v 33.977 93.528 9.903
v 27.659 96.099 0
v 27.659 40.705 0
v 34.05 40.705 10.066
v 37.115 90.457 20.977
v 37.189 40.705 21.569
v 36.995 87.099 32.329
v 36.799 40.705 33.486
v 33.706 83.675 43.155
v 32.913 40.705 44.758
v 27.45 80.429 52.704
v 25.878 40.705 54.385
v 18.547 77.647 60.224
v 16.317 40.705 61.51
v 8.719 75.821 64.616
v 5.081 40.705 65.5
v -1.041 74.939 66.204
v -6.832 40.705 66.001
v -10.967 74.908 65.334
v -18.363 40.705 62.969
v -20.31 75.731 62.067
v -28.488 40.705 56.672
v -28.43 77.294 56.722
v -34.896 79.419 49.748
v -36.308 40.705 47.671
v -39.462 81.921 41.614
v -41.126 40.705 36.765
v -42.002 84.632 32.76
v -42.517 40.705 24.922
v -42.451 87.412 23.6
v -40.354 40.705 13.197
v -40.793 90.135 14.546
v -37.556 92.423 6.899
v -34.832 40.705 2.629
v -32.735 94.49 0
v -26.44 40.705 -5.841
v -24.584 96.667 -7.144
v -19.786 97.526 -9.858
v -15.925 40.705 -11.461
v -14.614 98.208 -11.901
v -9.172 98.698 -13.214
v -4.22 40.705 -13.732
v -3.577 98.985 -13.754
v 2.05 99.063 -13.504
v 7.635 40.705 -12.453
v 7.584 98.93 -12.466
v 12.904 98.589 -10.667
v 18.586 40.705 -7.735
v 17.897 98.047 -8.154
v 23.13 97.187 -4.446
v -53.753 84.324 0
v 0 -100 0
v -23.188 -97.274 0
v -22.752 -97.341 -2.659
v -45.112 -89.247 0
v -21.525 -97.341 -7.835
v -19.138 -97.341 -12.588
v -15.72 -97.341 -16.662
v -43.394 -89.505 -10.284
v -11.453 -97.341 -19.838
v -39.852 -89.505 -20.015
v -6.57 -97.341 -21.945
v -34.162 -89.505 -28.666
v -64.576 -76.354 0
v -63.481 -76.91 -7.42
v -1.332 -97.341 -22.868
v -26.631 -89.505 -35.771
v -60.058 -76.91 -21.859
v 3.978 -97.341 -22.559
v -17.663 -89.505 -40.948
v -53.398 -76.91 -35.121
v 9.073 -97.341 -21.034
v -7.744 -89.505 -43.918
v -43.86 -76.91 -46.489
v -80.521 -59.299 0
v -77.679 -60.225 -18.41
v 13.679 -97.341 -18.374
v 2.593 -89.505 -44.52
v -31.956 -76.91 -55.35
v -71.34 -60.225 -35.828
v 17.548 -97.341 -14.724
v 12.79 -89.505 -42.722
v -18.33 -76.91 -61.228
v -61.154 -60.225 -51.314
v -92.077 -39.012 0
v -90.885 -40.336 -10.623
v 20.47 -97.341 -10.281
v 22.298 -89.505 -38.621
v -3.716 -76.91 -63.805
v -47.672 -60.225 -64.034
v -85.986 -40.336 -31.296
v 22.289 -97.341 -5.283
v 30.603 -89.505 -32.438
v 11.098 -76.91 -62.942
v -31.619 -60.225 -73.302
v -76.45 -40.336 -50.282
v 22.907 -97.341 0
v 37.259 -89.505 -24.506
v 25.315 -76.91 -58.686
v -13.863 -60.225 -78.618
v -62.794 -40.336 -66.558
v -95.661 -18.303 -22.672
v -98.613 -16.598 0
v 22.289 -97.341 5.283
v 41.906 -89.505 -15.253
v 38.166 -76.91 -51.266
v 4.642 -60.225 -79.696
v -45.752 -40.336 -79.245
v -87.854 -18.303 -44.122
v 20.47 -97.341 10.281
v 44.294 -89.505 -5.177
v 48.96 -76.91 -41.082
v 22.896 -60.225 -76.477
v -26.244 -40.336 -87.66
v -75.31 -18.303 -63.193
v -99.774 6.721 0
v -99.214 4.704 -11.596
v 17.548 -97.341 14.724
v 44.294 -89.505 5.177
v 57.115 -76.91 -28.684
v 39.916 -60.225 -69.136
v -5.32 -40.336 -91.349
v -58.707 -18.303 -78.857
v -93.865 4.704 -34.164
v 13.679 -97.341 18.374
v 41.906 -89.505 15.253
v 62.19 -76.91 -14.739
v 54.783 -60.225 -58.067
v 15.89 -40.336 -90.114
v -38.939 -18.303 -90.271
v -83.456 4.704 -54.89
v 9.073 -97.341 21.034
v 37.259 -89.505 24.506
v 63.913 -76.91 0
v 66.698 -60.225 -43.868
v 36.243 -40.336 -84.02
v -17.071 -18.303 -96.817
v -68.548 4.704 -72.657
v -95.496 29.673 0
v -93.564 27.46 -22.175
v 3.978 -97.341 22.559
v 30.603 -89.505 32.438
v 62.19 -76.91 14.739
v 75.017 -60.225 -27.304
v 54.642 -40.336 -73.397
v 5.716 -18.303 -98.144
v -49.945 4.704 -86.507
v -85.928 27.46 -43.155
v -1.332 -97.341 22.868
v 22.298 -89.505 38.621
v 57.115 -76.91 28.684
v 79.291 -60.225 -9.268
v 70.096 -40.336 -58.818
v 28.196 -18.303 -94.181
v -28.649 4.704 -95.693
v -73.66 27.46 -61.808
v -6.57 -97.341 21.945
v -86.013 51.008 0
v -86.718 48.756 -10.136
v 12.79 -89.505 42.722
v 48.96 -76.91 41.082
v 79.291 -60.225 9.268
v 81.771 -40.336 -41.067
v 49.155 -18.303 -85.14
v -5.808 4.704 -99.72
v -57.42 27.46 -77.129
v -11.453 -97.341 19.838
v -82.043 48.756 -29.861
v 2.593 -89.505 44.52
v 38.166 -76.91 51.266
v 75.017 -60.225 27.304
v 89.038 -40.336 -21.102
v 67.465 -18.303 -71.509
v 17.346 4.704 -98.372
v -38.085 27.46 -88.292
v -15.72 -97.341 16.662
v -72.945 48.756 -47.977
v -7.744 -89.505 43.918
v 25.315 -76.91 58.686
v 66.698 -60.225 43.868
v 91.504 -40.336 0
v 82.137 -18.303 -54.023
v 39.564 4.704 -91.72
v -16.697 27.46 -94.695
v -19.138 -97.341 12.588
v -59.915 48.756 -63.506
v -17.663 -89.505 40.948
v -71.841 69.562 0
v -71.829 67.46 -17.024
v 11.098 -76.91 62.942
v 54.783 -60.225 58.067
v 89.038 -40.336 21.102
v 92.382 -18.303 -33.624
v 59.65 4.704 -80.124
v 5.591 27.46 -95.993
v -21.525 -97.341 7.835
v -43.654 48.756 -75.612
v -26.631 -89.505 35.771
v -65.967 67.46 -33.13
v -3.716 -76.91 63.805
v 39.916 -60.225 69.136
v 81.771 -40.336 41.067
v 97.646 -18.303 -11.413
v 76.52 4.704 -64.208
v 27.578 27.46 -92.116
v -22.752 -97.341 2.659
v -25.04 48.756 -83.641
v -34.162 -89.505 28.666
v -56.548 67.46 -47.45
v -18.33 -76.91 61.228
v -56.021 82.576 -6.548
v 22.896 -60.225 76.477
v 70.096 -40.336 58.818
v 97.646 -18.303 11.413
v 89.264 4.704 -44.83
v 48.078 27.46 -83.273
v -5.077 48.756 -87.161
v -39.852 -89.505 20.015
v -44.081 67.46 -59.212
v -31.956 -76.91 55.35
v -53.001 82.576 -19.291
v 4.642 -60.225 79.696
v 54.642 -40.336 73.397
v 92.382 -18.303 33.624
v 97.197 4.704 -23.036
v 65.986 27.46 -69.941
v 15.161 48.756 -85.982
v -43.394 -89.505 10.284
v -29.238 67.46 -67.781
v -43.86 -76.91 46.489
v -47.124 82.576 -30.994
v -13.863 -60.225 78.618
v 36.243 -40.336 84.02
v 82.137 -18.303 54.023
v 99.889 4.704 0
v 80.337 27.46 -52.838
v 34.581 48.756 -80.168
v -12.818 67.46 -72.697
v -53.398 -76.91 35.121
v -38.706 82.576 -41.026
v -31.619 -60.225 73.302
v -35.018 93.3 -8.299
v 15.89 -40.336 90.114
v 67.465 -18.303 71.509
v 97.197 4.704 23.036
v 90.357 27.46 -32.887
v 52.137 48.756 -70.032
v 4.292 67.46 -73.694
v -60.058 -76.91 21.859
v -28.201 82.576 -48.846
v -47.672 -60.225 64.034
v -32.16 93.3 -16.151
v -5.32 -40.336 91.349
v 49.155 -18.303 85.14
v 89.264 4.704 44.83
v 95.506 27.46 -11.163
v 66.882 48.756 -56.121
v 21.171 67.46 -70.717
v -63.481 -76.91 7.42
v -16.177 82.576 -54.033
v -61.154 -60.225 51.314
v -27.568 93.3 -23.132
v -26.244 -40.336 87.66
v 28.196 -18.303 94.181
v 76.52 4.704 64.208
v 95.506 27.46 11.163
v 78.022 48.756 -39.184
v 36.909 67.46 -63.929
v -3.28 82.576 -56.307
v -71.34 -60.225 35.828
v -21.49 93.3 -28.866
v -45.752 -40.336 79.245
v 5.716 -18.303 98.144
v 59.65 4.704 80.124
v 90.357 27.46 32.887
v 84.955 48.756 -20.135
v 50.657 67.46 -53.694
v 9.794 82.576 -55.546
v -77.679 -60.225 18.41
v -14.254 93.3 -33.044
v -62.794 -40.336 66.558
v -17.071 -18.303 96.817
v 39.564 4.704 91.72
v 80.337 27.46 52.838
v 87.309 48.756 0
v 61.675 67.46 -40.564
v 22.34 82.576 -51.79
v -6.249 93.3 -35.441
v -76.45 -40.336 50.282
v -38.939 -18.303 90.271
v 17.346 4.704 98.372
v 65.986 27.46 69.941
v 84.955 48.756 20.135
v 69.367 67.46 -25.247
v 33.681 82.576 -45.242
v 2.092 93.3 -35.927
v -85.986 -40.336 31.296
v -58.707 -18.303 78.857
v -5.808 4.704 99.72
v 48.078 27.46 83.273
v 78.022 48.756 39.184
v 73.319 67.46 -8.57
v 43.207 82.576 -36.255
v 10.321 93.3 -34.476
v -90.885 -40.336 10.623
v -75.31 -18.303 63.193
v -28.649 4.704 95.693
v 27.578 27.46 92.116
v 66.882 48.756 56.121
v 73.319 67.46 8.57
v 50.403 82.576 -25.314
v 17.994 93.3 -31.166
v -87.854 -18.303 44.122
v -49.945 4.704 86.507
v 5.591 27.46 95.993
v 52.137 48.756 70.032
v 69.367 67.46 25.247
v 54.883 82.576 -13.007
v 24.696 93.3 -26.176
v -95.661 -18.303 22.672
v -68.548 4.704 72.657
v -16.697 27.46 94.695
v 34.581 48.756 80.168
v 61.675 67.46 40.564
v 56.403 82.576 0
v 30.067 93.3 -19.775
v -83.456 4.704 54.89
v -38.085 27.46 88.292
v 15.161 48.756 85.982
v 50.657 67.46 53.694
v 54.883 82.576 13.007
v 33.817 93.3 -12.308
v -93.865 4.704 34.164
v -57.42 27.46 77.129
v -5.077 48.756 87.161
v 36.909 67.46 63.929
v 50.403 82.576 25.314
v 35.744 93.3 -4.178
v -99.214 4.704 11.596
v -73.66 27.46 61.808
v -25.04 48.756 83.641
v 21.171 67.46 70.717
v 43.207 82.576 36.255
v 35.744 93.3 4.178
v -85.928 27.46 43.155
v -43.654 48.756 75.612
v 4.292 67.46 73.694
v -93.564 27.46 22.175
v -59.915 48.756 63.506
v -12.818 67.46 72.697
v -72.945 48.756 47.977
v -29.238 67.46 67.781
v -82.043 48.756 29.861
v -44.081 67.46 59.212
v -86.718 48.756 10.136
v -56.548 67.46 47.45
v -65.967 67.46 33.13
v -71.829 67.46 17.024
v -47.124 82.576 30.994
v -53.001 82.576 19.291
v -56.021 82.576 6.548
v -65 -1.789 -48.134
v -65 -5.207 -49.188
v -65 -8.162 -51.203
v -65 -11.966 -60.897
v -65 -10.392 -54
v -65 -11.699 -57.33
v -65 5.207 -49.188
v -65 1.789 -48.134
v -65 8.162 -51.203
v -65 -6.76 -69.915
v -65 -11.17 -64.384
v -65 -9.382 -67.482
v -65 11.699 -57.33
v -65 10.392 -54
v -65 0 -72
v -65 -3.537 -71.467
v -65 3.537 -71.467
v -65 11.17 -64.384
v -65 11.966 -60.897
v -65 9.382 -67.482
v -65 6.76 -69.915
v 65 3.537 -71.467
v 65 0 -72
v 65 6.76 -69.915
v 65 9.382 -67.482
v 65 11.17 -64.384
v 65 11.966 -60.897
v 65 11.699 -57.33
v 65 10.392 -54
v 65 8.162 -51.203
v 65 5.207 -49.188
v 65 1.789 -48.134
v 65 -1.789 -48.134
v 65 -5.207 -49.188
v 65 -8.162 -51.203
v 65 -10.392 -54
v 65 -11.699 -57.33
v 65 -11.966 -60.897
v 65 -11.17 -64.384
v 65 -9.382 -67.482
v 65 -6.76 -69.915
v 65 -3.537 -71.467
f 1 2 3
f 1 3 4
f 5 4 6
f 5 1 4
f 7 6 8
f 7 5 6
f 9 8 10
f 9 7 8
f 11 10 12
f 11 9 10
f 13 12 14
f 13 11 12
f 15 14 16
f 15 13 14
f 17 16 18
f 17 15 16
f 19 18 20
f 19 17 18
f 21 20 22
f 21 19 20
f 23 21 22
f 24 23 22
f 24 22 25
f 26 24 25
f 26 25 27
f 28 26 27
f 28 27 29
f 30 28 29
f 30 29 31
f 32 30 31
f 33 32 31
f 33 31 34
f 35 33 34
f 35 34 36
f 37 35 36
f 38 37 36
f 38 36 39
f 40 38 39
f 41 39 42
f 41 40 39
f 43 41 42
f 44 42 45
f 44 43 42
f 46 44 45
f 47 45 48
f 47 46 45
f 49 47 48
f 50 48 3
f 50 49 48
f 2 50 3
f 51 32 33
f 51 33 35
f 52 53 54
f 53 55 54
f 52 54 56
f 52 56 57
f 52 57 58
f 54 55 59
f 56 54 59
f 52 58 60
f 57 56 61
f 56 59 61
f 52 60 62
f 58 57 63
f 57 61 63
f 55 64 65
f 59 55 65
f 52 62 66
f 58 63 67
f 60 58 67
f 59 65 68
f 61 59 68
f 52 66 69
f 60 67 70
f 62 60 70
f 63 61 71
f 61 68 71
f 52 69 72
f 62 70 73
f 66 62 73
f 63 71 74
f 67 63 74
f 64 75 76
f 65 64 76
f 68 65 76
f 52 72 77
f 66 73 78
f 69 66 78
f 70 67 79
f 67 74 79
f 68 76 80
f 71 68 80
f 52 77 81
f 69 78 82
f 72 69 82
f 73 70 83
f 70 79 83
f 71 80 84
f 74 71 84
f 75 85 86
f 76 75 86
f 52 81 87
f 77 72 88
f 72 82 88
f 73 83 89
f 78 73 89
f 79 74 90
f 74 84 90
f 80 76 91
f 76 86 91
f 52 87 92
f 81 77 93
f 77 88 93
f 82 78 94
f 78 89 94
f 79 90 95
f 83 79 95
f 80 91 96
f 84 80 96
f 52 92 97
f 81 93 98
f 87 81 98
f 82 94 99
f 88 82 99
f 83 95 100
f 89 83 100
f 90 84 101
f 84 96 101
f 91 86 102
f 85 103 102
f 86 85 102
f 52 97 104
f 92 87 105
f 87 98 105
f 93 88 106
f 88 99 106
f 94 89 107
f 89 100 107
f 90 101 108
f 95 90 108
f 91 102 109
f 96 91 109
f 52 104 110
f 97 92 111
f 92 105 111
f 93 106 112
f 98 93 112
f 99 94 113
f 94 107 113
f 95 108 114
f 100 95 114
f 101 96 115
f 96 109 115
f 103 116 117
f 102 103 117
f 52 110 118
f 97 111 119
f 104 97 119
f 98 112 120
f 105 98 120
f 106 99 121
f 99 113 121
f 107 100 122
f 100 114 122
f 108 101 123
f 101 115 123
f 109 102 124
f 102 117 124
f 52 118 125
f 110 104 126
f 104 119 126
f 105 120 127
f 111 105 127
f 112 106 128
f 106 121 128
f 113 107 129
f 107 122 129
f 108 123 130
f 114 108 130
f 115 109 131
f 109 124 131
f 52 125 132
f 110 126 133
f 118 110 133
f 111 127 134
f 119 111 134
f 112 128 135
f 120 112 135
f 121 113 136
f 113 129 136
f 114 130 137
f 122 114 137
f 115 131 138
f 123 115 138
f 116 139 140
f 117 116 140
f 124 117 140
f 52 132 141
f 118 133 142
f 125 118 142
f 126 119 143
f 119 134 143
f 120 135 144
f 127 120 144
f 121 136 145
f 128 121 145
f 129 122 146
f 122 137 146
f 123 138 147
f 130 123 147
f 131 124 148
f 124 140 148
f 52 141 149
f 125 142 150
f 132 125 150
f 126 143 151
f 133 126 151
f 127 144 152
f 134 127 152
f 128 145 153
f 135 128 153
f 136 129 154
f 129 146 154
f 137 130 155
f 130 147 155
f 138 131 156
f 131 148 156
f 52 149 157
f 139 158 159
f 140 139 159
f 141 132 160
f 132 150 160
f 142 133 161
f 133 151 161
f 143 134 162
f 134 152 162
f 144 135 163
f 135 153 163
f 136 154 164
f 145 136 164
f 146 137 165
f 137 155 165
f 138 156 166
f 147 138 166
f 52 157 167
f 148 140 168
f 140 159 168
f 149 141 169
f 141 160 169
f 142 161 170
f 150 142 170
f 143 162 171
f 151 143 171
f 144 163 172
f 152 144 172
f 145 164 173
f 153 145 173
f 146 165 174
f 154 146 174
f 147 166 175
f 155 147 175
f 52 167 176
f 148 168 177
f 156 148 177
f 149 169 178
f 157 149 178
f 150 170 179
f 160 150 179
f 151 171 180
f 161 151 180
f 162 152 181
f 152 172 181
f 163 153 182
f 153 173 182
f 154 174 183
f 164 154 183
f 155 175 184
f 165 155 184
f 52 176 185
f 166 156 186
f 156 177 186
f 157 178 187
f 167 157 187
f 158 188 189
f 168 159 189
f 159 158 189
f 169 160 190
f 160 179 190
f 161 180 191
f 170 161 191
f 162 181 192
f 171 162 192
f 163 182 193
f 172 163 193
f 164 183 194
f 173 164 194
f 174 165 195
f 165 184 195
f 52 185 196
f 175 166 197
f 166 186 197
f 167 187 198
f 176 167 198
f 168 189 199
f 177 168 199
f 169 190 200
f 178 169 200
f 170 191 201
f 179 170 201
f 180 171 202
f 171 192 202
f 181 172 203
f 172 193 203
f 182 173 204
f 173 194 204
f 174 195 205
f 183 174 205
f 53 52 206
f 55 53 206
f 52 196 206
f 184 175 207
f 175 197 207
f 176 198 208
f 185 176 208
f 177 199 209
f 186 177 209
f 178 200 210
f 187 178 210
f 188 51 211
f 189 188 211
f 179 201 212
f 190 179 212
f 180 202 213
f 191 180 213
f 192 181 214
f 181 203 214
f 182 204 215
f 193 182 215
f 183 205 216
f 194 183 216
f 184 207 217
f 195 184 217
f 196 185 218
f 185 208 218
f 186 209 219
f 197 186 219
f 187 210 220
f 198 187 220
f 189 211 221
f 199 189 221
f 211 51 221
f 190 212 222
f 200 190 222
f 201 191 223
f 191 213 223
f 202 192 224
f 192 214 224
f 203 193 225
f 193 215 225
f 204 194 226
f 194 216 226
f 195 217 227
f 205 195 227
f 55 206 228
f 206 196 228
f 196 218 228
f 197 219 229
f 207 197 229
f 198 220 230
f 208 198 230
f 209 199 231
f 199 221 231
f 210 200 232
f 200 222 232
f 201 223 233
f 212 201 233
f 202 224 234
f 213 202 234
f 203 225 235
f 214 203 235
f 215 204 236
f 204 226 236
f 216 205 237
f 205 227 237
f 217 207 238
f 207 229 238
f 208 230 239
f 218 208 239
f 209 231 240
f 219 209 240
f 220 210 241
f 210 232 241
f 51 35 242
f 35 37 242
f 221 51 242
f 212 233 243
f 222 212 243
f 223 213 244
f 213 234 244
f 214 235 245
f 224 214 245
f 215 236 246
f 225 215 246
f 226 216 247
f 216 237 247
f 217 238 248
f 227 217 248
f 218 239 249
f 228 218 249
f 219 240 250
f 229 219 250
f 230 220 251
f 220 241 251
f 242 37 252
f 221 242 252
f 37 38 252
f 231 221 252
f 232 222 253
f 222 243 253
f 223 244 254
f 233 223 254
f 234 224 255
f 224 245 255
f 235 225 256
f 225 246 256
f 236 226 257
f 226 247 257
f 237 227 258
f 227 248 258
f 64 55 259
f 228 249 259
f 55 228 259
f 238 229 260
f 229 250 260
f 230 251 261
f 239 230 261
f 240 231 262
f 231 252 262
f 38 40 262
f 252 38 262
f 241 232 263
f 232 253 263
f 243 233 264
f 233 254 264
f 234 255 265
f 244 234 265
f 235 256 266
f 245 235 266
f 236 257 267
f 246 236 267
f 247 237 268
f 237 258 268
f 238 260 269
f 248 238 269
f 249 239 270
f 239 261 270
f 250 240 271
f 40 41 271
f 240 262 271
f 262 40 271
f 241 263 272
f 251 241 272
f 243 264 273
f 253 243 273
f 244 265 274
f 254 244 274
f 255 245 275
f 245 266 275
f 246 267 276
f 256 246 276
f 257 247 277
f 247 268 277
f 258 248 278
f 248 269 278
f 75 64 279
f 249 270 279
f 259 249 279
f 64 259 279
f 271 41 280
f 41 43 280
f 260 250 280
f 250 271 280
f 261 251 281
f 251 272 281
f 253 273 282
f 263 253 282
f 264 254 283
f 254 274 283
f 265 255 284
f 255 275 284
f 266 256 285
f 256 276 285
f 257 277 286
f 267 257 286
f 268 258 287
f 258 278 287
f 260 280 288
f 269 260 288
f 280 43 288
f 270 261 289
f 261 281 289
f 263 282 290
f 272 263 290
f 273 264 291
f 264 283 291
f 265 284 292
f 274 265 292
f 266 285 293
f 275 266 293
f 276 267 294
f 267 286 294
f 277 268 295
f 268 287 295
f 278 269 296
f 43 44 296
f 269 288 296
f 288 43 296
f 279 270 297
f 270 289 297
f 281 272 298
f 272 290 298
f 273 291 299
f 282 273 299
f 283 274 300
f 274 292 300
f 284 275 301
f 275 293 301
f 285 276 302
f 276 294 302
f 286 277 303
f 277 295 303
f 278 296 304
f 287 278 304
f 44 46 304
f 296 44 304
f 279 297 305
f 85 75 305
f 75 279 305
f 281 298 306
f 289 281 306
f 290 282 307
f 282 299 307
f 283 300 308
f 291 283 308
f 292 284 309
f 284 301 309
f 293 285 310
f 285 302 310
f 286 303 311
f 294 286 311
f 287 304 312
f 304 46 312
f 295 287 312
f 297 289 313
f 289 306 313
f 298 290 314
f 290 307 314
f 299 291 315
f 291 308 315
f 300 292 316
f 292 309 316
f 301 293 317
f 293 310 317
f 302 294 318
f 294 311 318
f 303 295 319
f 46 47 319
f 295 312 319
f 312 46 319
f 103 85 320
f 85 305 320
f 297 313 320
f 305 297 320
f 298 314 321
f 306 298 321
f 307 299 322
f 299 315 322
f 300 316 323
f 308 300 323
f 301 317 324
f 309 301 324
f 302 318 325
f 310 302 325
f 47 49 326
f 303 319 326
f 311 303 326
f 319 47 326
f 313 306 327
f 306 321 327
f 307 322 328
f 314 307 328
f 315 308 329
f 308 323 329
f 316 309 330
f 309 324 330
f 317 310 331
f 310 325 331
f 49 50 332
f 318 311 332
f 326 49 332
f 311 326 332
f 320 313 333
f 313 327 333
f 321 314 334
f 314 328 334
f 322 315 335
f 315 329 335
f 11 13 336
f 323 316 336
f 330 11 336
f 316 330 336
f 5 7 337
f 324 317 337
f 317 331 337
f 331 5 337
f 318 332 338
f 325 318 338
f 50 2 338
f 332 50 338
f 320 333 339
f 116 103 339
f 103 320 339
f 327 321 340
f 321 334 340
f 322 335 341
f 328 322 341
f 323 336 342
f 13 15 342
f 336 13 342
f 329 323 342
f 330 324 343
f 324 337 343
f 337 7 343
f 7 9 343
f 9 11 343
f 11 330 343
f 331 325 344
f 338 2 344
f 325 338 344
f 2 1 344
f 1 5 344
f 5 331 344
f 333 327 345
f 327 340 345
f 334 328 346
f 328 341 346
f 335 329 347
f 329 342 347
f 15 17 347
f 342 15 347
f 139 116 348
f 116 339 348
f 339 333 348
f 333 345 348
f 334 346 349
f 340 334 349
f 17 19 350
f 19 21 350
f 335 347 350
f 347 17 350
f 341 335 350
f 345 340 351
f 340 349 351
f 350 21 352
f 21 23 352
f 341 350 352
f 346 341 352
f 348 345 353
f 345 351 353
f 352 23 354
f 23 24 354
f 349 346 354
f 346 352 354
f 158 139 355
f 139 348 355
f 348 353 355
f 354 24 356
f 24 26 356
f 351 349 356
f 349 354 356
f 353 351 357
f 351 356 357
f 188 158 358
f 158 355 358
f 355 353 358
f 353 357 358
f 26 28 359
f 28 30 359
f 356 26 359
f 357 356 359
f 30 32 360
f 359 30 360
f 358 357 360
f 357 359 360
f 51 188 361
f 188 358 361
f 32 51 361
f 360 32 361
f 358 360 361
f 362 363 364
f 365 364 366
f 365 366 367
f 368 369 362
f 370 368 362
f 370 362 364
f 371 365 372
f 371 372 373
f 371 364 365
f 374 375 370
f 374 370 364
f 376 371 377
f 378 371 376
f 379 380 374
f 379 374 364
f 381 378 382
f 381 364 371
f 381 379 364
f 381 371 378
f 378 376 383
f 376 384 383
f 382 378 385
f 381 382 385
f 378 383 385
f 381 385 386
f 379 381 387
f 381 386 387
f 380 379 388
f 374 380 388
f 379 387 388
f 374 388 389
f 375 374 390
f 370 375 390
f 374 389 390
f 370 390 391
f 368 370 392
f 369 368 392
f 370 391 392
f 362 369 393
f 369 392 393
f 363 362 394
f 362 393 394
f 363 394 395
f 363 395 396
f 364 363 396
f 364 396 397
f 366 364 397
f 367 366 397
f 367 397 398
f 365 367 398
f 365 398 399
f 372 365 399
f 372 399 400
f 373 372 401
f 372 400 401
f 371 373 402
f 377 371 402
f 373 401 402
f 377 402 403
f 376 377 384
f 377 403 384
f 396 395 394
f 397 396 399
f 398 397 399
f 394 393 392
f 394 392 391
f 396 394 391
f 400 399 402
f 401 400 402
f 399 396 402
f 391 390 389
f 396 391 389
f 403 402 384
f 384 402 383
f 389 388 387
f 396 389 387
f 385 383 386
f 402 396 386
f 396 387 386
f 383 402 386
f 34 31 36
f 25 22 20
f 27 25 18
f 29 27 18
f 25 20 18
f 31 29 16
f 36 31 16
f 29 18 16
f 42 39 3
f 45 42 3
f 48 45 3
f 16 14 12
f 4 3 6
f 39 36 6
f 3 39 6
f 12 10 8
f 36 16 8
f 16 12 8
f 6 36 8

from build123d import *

# Parameters (mm, degrees)
SKETCH6_R          = 40
CUT_EXTRUDE3_DEPTH = 59.294788524860515
SKETCH13_R         = 11.999999999999975
CUT_EXTRUDE7_DEPTH = 65


with BuildPart() as part:
    # Sketch2 → Revolve2 (revolve)
    with BuildSketch(Plane.XY):
        with BuildLine():
            Line((0, 100), (2.776e-14, -100))
            ThreePointArc((2.776e-14, -100), (-100, 1.225e-14), (0, 100))
        make_face()
    revolve(axis=Axis((0, 100, 0), (1.4e-16, -1, 0)))

    # Sketch6 → Cut-Extrude3 (cut)
    with BuildSketch(Plane(origin=(-2.5379788603345292, 100, 26.23220958860291), x_dir=(-1, 0, 0), z_dir=(0, -1, 0))):
        with Locations(Location((0, 0, 0), (0, 0, 139.019257533))):
            Circle(SKETCH6_R)
    extrude(amount=CUT_EXTRUDE3_DEPTH, mode=Mode.SUBTRACT)

    # Sketch13 → Cut-Extrude7 (cut, symmetric)
    with BuildSketch(Plane(origin=(0, 0, 0), x_dir=(0, 0, -1), z_dir=(1, 0, 0))):
        with Locations((60, 0)):
            Circle(SKETCH13_R)
    extrude(amount=CUT_EXTRUDE7_DEPTH, both=True, mode=Mode.SUBTRACT)


solid = part.part
